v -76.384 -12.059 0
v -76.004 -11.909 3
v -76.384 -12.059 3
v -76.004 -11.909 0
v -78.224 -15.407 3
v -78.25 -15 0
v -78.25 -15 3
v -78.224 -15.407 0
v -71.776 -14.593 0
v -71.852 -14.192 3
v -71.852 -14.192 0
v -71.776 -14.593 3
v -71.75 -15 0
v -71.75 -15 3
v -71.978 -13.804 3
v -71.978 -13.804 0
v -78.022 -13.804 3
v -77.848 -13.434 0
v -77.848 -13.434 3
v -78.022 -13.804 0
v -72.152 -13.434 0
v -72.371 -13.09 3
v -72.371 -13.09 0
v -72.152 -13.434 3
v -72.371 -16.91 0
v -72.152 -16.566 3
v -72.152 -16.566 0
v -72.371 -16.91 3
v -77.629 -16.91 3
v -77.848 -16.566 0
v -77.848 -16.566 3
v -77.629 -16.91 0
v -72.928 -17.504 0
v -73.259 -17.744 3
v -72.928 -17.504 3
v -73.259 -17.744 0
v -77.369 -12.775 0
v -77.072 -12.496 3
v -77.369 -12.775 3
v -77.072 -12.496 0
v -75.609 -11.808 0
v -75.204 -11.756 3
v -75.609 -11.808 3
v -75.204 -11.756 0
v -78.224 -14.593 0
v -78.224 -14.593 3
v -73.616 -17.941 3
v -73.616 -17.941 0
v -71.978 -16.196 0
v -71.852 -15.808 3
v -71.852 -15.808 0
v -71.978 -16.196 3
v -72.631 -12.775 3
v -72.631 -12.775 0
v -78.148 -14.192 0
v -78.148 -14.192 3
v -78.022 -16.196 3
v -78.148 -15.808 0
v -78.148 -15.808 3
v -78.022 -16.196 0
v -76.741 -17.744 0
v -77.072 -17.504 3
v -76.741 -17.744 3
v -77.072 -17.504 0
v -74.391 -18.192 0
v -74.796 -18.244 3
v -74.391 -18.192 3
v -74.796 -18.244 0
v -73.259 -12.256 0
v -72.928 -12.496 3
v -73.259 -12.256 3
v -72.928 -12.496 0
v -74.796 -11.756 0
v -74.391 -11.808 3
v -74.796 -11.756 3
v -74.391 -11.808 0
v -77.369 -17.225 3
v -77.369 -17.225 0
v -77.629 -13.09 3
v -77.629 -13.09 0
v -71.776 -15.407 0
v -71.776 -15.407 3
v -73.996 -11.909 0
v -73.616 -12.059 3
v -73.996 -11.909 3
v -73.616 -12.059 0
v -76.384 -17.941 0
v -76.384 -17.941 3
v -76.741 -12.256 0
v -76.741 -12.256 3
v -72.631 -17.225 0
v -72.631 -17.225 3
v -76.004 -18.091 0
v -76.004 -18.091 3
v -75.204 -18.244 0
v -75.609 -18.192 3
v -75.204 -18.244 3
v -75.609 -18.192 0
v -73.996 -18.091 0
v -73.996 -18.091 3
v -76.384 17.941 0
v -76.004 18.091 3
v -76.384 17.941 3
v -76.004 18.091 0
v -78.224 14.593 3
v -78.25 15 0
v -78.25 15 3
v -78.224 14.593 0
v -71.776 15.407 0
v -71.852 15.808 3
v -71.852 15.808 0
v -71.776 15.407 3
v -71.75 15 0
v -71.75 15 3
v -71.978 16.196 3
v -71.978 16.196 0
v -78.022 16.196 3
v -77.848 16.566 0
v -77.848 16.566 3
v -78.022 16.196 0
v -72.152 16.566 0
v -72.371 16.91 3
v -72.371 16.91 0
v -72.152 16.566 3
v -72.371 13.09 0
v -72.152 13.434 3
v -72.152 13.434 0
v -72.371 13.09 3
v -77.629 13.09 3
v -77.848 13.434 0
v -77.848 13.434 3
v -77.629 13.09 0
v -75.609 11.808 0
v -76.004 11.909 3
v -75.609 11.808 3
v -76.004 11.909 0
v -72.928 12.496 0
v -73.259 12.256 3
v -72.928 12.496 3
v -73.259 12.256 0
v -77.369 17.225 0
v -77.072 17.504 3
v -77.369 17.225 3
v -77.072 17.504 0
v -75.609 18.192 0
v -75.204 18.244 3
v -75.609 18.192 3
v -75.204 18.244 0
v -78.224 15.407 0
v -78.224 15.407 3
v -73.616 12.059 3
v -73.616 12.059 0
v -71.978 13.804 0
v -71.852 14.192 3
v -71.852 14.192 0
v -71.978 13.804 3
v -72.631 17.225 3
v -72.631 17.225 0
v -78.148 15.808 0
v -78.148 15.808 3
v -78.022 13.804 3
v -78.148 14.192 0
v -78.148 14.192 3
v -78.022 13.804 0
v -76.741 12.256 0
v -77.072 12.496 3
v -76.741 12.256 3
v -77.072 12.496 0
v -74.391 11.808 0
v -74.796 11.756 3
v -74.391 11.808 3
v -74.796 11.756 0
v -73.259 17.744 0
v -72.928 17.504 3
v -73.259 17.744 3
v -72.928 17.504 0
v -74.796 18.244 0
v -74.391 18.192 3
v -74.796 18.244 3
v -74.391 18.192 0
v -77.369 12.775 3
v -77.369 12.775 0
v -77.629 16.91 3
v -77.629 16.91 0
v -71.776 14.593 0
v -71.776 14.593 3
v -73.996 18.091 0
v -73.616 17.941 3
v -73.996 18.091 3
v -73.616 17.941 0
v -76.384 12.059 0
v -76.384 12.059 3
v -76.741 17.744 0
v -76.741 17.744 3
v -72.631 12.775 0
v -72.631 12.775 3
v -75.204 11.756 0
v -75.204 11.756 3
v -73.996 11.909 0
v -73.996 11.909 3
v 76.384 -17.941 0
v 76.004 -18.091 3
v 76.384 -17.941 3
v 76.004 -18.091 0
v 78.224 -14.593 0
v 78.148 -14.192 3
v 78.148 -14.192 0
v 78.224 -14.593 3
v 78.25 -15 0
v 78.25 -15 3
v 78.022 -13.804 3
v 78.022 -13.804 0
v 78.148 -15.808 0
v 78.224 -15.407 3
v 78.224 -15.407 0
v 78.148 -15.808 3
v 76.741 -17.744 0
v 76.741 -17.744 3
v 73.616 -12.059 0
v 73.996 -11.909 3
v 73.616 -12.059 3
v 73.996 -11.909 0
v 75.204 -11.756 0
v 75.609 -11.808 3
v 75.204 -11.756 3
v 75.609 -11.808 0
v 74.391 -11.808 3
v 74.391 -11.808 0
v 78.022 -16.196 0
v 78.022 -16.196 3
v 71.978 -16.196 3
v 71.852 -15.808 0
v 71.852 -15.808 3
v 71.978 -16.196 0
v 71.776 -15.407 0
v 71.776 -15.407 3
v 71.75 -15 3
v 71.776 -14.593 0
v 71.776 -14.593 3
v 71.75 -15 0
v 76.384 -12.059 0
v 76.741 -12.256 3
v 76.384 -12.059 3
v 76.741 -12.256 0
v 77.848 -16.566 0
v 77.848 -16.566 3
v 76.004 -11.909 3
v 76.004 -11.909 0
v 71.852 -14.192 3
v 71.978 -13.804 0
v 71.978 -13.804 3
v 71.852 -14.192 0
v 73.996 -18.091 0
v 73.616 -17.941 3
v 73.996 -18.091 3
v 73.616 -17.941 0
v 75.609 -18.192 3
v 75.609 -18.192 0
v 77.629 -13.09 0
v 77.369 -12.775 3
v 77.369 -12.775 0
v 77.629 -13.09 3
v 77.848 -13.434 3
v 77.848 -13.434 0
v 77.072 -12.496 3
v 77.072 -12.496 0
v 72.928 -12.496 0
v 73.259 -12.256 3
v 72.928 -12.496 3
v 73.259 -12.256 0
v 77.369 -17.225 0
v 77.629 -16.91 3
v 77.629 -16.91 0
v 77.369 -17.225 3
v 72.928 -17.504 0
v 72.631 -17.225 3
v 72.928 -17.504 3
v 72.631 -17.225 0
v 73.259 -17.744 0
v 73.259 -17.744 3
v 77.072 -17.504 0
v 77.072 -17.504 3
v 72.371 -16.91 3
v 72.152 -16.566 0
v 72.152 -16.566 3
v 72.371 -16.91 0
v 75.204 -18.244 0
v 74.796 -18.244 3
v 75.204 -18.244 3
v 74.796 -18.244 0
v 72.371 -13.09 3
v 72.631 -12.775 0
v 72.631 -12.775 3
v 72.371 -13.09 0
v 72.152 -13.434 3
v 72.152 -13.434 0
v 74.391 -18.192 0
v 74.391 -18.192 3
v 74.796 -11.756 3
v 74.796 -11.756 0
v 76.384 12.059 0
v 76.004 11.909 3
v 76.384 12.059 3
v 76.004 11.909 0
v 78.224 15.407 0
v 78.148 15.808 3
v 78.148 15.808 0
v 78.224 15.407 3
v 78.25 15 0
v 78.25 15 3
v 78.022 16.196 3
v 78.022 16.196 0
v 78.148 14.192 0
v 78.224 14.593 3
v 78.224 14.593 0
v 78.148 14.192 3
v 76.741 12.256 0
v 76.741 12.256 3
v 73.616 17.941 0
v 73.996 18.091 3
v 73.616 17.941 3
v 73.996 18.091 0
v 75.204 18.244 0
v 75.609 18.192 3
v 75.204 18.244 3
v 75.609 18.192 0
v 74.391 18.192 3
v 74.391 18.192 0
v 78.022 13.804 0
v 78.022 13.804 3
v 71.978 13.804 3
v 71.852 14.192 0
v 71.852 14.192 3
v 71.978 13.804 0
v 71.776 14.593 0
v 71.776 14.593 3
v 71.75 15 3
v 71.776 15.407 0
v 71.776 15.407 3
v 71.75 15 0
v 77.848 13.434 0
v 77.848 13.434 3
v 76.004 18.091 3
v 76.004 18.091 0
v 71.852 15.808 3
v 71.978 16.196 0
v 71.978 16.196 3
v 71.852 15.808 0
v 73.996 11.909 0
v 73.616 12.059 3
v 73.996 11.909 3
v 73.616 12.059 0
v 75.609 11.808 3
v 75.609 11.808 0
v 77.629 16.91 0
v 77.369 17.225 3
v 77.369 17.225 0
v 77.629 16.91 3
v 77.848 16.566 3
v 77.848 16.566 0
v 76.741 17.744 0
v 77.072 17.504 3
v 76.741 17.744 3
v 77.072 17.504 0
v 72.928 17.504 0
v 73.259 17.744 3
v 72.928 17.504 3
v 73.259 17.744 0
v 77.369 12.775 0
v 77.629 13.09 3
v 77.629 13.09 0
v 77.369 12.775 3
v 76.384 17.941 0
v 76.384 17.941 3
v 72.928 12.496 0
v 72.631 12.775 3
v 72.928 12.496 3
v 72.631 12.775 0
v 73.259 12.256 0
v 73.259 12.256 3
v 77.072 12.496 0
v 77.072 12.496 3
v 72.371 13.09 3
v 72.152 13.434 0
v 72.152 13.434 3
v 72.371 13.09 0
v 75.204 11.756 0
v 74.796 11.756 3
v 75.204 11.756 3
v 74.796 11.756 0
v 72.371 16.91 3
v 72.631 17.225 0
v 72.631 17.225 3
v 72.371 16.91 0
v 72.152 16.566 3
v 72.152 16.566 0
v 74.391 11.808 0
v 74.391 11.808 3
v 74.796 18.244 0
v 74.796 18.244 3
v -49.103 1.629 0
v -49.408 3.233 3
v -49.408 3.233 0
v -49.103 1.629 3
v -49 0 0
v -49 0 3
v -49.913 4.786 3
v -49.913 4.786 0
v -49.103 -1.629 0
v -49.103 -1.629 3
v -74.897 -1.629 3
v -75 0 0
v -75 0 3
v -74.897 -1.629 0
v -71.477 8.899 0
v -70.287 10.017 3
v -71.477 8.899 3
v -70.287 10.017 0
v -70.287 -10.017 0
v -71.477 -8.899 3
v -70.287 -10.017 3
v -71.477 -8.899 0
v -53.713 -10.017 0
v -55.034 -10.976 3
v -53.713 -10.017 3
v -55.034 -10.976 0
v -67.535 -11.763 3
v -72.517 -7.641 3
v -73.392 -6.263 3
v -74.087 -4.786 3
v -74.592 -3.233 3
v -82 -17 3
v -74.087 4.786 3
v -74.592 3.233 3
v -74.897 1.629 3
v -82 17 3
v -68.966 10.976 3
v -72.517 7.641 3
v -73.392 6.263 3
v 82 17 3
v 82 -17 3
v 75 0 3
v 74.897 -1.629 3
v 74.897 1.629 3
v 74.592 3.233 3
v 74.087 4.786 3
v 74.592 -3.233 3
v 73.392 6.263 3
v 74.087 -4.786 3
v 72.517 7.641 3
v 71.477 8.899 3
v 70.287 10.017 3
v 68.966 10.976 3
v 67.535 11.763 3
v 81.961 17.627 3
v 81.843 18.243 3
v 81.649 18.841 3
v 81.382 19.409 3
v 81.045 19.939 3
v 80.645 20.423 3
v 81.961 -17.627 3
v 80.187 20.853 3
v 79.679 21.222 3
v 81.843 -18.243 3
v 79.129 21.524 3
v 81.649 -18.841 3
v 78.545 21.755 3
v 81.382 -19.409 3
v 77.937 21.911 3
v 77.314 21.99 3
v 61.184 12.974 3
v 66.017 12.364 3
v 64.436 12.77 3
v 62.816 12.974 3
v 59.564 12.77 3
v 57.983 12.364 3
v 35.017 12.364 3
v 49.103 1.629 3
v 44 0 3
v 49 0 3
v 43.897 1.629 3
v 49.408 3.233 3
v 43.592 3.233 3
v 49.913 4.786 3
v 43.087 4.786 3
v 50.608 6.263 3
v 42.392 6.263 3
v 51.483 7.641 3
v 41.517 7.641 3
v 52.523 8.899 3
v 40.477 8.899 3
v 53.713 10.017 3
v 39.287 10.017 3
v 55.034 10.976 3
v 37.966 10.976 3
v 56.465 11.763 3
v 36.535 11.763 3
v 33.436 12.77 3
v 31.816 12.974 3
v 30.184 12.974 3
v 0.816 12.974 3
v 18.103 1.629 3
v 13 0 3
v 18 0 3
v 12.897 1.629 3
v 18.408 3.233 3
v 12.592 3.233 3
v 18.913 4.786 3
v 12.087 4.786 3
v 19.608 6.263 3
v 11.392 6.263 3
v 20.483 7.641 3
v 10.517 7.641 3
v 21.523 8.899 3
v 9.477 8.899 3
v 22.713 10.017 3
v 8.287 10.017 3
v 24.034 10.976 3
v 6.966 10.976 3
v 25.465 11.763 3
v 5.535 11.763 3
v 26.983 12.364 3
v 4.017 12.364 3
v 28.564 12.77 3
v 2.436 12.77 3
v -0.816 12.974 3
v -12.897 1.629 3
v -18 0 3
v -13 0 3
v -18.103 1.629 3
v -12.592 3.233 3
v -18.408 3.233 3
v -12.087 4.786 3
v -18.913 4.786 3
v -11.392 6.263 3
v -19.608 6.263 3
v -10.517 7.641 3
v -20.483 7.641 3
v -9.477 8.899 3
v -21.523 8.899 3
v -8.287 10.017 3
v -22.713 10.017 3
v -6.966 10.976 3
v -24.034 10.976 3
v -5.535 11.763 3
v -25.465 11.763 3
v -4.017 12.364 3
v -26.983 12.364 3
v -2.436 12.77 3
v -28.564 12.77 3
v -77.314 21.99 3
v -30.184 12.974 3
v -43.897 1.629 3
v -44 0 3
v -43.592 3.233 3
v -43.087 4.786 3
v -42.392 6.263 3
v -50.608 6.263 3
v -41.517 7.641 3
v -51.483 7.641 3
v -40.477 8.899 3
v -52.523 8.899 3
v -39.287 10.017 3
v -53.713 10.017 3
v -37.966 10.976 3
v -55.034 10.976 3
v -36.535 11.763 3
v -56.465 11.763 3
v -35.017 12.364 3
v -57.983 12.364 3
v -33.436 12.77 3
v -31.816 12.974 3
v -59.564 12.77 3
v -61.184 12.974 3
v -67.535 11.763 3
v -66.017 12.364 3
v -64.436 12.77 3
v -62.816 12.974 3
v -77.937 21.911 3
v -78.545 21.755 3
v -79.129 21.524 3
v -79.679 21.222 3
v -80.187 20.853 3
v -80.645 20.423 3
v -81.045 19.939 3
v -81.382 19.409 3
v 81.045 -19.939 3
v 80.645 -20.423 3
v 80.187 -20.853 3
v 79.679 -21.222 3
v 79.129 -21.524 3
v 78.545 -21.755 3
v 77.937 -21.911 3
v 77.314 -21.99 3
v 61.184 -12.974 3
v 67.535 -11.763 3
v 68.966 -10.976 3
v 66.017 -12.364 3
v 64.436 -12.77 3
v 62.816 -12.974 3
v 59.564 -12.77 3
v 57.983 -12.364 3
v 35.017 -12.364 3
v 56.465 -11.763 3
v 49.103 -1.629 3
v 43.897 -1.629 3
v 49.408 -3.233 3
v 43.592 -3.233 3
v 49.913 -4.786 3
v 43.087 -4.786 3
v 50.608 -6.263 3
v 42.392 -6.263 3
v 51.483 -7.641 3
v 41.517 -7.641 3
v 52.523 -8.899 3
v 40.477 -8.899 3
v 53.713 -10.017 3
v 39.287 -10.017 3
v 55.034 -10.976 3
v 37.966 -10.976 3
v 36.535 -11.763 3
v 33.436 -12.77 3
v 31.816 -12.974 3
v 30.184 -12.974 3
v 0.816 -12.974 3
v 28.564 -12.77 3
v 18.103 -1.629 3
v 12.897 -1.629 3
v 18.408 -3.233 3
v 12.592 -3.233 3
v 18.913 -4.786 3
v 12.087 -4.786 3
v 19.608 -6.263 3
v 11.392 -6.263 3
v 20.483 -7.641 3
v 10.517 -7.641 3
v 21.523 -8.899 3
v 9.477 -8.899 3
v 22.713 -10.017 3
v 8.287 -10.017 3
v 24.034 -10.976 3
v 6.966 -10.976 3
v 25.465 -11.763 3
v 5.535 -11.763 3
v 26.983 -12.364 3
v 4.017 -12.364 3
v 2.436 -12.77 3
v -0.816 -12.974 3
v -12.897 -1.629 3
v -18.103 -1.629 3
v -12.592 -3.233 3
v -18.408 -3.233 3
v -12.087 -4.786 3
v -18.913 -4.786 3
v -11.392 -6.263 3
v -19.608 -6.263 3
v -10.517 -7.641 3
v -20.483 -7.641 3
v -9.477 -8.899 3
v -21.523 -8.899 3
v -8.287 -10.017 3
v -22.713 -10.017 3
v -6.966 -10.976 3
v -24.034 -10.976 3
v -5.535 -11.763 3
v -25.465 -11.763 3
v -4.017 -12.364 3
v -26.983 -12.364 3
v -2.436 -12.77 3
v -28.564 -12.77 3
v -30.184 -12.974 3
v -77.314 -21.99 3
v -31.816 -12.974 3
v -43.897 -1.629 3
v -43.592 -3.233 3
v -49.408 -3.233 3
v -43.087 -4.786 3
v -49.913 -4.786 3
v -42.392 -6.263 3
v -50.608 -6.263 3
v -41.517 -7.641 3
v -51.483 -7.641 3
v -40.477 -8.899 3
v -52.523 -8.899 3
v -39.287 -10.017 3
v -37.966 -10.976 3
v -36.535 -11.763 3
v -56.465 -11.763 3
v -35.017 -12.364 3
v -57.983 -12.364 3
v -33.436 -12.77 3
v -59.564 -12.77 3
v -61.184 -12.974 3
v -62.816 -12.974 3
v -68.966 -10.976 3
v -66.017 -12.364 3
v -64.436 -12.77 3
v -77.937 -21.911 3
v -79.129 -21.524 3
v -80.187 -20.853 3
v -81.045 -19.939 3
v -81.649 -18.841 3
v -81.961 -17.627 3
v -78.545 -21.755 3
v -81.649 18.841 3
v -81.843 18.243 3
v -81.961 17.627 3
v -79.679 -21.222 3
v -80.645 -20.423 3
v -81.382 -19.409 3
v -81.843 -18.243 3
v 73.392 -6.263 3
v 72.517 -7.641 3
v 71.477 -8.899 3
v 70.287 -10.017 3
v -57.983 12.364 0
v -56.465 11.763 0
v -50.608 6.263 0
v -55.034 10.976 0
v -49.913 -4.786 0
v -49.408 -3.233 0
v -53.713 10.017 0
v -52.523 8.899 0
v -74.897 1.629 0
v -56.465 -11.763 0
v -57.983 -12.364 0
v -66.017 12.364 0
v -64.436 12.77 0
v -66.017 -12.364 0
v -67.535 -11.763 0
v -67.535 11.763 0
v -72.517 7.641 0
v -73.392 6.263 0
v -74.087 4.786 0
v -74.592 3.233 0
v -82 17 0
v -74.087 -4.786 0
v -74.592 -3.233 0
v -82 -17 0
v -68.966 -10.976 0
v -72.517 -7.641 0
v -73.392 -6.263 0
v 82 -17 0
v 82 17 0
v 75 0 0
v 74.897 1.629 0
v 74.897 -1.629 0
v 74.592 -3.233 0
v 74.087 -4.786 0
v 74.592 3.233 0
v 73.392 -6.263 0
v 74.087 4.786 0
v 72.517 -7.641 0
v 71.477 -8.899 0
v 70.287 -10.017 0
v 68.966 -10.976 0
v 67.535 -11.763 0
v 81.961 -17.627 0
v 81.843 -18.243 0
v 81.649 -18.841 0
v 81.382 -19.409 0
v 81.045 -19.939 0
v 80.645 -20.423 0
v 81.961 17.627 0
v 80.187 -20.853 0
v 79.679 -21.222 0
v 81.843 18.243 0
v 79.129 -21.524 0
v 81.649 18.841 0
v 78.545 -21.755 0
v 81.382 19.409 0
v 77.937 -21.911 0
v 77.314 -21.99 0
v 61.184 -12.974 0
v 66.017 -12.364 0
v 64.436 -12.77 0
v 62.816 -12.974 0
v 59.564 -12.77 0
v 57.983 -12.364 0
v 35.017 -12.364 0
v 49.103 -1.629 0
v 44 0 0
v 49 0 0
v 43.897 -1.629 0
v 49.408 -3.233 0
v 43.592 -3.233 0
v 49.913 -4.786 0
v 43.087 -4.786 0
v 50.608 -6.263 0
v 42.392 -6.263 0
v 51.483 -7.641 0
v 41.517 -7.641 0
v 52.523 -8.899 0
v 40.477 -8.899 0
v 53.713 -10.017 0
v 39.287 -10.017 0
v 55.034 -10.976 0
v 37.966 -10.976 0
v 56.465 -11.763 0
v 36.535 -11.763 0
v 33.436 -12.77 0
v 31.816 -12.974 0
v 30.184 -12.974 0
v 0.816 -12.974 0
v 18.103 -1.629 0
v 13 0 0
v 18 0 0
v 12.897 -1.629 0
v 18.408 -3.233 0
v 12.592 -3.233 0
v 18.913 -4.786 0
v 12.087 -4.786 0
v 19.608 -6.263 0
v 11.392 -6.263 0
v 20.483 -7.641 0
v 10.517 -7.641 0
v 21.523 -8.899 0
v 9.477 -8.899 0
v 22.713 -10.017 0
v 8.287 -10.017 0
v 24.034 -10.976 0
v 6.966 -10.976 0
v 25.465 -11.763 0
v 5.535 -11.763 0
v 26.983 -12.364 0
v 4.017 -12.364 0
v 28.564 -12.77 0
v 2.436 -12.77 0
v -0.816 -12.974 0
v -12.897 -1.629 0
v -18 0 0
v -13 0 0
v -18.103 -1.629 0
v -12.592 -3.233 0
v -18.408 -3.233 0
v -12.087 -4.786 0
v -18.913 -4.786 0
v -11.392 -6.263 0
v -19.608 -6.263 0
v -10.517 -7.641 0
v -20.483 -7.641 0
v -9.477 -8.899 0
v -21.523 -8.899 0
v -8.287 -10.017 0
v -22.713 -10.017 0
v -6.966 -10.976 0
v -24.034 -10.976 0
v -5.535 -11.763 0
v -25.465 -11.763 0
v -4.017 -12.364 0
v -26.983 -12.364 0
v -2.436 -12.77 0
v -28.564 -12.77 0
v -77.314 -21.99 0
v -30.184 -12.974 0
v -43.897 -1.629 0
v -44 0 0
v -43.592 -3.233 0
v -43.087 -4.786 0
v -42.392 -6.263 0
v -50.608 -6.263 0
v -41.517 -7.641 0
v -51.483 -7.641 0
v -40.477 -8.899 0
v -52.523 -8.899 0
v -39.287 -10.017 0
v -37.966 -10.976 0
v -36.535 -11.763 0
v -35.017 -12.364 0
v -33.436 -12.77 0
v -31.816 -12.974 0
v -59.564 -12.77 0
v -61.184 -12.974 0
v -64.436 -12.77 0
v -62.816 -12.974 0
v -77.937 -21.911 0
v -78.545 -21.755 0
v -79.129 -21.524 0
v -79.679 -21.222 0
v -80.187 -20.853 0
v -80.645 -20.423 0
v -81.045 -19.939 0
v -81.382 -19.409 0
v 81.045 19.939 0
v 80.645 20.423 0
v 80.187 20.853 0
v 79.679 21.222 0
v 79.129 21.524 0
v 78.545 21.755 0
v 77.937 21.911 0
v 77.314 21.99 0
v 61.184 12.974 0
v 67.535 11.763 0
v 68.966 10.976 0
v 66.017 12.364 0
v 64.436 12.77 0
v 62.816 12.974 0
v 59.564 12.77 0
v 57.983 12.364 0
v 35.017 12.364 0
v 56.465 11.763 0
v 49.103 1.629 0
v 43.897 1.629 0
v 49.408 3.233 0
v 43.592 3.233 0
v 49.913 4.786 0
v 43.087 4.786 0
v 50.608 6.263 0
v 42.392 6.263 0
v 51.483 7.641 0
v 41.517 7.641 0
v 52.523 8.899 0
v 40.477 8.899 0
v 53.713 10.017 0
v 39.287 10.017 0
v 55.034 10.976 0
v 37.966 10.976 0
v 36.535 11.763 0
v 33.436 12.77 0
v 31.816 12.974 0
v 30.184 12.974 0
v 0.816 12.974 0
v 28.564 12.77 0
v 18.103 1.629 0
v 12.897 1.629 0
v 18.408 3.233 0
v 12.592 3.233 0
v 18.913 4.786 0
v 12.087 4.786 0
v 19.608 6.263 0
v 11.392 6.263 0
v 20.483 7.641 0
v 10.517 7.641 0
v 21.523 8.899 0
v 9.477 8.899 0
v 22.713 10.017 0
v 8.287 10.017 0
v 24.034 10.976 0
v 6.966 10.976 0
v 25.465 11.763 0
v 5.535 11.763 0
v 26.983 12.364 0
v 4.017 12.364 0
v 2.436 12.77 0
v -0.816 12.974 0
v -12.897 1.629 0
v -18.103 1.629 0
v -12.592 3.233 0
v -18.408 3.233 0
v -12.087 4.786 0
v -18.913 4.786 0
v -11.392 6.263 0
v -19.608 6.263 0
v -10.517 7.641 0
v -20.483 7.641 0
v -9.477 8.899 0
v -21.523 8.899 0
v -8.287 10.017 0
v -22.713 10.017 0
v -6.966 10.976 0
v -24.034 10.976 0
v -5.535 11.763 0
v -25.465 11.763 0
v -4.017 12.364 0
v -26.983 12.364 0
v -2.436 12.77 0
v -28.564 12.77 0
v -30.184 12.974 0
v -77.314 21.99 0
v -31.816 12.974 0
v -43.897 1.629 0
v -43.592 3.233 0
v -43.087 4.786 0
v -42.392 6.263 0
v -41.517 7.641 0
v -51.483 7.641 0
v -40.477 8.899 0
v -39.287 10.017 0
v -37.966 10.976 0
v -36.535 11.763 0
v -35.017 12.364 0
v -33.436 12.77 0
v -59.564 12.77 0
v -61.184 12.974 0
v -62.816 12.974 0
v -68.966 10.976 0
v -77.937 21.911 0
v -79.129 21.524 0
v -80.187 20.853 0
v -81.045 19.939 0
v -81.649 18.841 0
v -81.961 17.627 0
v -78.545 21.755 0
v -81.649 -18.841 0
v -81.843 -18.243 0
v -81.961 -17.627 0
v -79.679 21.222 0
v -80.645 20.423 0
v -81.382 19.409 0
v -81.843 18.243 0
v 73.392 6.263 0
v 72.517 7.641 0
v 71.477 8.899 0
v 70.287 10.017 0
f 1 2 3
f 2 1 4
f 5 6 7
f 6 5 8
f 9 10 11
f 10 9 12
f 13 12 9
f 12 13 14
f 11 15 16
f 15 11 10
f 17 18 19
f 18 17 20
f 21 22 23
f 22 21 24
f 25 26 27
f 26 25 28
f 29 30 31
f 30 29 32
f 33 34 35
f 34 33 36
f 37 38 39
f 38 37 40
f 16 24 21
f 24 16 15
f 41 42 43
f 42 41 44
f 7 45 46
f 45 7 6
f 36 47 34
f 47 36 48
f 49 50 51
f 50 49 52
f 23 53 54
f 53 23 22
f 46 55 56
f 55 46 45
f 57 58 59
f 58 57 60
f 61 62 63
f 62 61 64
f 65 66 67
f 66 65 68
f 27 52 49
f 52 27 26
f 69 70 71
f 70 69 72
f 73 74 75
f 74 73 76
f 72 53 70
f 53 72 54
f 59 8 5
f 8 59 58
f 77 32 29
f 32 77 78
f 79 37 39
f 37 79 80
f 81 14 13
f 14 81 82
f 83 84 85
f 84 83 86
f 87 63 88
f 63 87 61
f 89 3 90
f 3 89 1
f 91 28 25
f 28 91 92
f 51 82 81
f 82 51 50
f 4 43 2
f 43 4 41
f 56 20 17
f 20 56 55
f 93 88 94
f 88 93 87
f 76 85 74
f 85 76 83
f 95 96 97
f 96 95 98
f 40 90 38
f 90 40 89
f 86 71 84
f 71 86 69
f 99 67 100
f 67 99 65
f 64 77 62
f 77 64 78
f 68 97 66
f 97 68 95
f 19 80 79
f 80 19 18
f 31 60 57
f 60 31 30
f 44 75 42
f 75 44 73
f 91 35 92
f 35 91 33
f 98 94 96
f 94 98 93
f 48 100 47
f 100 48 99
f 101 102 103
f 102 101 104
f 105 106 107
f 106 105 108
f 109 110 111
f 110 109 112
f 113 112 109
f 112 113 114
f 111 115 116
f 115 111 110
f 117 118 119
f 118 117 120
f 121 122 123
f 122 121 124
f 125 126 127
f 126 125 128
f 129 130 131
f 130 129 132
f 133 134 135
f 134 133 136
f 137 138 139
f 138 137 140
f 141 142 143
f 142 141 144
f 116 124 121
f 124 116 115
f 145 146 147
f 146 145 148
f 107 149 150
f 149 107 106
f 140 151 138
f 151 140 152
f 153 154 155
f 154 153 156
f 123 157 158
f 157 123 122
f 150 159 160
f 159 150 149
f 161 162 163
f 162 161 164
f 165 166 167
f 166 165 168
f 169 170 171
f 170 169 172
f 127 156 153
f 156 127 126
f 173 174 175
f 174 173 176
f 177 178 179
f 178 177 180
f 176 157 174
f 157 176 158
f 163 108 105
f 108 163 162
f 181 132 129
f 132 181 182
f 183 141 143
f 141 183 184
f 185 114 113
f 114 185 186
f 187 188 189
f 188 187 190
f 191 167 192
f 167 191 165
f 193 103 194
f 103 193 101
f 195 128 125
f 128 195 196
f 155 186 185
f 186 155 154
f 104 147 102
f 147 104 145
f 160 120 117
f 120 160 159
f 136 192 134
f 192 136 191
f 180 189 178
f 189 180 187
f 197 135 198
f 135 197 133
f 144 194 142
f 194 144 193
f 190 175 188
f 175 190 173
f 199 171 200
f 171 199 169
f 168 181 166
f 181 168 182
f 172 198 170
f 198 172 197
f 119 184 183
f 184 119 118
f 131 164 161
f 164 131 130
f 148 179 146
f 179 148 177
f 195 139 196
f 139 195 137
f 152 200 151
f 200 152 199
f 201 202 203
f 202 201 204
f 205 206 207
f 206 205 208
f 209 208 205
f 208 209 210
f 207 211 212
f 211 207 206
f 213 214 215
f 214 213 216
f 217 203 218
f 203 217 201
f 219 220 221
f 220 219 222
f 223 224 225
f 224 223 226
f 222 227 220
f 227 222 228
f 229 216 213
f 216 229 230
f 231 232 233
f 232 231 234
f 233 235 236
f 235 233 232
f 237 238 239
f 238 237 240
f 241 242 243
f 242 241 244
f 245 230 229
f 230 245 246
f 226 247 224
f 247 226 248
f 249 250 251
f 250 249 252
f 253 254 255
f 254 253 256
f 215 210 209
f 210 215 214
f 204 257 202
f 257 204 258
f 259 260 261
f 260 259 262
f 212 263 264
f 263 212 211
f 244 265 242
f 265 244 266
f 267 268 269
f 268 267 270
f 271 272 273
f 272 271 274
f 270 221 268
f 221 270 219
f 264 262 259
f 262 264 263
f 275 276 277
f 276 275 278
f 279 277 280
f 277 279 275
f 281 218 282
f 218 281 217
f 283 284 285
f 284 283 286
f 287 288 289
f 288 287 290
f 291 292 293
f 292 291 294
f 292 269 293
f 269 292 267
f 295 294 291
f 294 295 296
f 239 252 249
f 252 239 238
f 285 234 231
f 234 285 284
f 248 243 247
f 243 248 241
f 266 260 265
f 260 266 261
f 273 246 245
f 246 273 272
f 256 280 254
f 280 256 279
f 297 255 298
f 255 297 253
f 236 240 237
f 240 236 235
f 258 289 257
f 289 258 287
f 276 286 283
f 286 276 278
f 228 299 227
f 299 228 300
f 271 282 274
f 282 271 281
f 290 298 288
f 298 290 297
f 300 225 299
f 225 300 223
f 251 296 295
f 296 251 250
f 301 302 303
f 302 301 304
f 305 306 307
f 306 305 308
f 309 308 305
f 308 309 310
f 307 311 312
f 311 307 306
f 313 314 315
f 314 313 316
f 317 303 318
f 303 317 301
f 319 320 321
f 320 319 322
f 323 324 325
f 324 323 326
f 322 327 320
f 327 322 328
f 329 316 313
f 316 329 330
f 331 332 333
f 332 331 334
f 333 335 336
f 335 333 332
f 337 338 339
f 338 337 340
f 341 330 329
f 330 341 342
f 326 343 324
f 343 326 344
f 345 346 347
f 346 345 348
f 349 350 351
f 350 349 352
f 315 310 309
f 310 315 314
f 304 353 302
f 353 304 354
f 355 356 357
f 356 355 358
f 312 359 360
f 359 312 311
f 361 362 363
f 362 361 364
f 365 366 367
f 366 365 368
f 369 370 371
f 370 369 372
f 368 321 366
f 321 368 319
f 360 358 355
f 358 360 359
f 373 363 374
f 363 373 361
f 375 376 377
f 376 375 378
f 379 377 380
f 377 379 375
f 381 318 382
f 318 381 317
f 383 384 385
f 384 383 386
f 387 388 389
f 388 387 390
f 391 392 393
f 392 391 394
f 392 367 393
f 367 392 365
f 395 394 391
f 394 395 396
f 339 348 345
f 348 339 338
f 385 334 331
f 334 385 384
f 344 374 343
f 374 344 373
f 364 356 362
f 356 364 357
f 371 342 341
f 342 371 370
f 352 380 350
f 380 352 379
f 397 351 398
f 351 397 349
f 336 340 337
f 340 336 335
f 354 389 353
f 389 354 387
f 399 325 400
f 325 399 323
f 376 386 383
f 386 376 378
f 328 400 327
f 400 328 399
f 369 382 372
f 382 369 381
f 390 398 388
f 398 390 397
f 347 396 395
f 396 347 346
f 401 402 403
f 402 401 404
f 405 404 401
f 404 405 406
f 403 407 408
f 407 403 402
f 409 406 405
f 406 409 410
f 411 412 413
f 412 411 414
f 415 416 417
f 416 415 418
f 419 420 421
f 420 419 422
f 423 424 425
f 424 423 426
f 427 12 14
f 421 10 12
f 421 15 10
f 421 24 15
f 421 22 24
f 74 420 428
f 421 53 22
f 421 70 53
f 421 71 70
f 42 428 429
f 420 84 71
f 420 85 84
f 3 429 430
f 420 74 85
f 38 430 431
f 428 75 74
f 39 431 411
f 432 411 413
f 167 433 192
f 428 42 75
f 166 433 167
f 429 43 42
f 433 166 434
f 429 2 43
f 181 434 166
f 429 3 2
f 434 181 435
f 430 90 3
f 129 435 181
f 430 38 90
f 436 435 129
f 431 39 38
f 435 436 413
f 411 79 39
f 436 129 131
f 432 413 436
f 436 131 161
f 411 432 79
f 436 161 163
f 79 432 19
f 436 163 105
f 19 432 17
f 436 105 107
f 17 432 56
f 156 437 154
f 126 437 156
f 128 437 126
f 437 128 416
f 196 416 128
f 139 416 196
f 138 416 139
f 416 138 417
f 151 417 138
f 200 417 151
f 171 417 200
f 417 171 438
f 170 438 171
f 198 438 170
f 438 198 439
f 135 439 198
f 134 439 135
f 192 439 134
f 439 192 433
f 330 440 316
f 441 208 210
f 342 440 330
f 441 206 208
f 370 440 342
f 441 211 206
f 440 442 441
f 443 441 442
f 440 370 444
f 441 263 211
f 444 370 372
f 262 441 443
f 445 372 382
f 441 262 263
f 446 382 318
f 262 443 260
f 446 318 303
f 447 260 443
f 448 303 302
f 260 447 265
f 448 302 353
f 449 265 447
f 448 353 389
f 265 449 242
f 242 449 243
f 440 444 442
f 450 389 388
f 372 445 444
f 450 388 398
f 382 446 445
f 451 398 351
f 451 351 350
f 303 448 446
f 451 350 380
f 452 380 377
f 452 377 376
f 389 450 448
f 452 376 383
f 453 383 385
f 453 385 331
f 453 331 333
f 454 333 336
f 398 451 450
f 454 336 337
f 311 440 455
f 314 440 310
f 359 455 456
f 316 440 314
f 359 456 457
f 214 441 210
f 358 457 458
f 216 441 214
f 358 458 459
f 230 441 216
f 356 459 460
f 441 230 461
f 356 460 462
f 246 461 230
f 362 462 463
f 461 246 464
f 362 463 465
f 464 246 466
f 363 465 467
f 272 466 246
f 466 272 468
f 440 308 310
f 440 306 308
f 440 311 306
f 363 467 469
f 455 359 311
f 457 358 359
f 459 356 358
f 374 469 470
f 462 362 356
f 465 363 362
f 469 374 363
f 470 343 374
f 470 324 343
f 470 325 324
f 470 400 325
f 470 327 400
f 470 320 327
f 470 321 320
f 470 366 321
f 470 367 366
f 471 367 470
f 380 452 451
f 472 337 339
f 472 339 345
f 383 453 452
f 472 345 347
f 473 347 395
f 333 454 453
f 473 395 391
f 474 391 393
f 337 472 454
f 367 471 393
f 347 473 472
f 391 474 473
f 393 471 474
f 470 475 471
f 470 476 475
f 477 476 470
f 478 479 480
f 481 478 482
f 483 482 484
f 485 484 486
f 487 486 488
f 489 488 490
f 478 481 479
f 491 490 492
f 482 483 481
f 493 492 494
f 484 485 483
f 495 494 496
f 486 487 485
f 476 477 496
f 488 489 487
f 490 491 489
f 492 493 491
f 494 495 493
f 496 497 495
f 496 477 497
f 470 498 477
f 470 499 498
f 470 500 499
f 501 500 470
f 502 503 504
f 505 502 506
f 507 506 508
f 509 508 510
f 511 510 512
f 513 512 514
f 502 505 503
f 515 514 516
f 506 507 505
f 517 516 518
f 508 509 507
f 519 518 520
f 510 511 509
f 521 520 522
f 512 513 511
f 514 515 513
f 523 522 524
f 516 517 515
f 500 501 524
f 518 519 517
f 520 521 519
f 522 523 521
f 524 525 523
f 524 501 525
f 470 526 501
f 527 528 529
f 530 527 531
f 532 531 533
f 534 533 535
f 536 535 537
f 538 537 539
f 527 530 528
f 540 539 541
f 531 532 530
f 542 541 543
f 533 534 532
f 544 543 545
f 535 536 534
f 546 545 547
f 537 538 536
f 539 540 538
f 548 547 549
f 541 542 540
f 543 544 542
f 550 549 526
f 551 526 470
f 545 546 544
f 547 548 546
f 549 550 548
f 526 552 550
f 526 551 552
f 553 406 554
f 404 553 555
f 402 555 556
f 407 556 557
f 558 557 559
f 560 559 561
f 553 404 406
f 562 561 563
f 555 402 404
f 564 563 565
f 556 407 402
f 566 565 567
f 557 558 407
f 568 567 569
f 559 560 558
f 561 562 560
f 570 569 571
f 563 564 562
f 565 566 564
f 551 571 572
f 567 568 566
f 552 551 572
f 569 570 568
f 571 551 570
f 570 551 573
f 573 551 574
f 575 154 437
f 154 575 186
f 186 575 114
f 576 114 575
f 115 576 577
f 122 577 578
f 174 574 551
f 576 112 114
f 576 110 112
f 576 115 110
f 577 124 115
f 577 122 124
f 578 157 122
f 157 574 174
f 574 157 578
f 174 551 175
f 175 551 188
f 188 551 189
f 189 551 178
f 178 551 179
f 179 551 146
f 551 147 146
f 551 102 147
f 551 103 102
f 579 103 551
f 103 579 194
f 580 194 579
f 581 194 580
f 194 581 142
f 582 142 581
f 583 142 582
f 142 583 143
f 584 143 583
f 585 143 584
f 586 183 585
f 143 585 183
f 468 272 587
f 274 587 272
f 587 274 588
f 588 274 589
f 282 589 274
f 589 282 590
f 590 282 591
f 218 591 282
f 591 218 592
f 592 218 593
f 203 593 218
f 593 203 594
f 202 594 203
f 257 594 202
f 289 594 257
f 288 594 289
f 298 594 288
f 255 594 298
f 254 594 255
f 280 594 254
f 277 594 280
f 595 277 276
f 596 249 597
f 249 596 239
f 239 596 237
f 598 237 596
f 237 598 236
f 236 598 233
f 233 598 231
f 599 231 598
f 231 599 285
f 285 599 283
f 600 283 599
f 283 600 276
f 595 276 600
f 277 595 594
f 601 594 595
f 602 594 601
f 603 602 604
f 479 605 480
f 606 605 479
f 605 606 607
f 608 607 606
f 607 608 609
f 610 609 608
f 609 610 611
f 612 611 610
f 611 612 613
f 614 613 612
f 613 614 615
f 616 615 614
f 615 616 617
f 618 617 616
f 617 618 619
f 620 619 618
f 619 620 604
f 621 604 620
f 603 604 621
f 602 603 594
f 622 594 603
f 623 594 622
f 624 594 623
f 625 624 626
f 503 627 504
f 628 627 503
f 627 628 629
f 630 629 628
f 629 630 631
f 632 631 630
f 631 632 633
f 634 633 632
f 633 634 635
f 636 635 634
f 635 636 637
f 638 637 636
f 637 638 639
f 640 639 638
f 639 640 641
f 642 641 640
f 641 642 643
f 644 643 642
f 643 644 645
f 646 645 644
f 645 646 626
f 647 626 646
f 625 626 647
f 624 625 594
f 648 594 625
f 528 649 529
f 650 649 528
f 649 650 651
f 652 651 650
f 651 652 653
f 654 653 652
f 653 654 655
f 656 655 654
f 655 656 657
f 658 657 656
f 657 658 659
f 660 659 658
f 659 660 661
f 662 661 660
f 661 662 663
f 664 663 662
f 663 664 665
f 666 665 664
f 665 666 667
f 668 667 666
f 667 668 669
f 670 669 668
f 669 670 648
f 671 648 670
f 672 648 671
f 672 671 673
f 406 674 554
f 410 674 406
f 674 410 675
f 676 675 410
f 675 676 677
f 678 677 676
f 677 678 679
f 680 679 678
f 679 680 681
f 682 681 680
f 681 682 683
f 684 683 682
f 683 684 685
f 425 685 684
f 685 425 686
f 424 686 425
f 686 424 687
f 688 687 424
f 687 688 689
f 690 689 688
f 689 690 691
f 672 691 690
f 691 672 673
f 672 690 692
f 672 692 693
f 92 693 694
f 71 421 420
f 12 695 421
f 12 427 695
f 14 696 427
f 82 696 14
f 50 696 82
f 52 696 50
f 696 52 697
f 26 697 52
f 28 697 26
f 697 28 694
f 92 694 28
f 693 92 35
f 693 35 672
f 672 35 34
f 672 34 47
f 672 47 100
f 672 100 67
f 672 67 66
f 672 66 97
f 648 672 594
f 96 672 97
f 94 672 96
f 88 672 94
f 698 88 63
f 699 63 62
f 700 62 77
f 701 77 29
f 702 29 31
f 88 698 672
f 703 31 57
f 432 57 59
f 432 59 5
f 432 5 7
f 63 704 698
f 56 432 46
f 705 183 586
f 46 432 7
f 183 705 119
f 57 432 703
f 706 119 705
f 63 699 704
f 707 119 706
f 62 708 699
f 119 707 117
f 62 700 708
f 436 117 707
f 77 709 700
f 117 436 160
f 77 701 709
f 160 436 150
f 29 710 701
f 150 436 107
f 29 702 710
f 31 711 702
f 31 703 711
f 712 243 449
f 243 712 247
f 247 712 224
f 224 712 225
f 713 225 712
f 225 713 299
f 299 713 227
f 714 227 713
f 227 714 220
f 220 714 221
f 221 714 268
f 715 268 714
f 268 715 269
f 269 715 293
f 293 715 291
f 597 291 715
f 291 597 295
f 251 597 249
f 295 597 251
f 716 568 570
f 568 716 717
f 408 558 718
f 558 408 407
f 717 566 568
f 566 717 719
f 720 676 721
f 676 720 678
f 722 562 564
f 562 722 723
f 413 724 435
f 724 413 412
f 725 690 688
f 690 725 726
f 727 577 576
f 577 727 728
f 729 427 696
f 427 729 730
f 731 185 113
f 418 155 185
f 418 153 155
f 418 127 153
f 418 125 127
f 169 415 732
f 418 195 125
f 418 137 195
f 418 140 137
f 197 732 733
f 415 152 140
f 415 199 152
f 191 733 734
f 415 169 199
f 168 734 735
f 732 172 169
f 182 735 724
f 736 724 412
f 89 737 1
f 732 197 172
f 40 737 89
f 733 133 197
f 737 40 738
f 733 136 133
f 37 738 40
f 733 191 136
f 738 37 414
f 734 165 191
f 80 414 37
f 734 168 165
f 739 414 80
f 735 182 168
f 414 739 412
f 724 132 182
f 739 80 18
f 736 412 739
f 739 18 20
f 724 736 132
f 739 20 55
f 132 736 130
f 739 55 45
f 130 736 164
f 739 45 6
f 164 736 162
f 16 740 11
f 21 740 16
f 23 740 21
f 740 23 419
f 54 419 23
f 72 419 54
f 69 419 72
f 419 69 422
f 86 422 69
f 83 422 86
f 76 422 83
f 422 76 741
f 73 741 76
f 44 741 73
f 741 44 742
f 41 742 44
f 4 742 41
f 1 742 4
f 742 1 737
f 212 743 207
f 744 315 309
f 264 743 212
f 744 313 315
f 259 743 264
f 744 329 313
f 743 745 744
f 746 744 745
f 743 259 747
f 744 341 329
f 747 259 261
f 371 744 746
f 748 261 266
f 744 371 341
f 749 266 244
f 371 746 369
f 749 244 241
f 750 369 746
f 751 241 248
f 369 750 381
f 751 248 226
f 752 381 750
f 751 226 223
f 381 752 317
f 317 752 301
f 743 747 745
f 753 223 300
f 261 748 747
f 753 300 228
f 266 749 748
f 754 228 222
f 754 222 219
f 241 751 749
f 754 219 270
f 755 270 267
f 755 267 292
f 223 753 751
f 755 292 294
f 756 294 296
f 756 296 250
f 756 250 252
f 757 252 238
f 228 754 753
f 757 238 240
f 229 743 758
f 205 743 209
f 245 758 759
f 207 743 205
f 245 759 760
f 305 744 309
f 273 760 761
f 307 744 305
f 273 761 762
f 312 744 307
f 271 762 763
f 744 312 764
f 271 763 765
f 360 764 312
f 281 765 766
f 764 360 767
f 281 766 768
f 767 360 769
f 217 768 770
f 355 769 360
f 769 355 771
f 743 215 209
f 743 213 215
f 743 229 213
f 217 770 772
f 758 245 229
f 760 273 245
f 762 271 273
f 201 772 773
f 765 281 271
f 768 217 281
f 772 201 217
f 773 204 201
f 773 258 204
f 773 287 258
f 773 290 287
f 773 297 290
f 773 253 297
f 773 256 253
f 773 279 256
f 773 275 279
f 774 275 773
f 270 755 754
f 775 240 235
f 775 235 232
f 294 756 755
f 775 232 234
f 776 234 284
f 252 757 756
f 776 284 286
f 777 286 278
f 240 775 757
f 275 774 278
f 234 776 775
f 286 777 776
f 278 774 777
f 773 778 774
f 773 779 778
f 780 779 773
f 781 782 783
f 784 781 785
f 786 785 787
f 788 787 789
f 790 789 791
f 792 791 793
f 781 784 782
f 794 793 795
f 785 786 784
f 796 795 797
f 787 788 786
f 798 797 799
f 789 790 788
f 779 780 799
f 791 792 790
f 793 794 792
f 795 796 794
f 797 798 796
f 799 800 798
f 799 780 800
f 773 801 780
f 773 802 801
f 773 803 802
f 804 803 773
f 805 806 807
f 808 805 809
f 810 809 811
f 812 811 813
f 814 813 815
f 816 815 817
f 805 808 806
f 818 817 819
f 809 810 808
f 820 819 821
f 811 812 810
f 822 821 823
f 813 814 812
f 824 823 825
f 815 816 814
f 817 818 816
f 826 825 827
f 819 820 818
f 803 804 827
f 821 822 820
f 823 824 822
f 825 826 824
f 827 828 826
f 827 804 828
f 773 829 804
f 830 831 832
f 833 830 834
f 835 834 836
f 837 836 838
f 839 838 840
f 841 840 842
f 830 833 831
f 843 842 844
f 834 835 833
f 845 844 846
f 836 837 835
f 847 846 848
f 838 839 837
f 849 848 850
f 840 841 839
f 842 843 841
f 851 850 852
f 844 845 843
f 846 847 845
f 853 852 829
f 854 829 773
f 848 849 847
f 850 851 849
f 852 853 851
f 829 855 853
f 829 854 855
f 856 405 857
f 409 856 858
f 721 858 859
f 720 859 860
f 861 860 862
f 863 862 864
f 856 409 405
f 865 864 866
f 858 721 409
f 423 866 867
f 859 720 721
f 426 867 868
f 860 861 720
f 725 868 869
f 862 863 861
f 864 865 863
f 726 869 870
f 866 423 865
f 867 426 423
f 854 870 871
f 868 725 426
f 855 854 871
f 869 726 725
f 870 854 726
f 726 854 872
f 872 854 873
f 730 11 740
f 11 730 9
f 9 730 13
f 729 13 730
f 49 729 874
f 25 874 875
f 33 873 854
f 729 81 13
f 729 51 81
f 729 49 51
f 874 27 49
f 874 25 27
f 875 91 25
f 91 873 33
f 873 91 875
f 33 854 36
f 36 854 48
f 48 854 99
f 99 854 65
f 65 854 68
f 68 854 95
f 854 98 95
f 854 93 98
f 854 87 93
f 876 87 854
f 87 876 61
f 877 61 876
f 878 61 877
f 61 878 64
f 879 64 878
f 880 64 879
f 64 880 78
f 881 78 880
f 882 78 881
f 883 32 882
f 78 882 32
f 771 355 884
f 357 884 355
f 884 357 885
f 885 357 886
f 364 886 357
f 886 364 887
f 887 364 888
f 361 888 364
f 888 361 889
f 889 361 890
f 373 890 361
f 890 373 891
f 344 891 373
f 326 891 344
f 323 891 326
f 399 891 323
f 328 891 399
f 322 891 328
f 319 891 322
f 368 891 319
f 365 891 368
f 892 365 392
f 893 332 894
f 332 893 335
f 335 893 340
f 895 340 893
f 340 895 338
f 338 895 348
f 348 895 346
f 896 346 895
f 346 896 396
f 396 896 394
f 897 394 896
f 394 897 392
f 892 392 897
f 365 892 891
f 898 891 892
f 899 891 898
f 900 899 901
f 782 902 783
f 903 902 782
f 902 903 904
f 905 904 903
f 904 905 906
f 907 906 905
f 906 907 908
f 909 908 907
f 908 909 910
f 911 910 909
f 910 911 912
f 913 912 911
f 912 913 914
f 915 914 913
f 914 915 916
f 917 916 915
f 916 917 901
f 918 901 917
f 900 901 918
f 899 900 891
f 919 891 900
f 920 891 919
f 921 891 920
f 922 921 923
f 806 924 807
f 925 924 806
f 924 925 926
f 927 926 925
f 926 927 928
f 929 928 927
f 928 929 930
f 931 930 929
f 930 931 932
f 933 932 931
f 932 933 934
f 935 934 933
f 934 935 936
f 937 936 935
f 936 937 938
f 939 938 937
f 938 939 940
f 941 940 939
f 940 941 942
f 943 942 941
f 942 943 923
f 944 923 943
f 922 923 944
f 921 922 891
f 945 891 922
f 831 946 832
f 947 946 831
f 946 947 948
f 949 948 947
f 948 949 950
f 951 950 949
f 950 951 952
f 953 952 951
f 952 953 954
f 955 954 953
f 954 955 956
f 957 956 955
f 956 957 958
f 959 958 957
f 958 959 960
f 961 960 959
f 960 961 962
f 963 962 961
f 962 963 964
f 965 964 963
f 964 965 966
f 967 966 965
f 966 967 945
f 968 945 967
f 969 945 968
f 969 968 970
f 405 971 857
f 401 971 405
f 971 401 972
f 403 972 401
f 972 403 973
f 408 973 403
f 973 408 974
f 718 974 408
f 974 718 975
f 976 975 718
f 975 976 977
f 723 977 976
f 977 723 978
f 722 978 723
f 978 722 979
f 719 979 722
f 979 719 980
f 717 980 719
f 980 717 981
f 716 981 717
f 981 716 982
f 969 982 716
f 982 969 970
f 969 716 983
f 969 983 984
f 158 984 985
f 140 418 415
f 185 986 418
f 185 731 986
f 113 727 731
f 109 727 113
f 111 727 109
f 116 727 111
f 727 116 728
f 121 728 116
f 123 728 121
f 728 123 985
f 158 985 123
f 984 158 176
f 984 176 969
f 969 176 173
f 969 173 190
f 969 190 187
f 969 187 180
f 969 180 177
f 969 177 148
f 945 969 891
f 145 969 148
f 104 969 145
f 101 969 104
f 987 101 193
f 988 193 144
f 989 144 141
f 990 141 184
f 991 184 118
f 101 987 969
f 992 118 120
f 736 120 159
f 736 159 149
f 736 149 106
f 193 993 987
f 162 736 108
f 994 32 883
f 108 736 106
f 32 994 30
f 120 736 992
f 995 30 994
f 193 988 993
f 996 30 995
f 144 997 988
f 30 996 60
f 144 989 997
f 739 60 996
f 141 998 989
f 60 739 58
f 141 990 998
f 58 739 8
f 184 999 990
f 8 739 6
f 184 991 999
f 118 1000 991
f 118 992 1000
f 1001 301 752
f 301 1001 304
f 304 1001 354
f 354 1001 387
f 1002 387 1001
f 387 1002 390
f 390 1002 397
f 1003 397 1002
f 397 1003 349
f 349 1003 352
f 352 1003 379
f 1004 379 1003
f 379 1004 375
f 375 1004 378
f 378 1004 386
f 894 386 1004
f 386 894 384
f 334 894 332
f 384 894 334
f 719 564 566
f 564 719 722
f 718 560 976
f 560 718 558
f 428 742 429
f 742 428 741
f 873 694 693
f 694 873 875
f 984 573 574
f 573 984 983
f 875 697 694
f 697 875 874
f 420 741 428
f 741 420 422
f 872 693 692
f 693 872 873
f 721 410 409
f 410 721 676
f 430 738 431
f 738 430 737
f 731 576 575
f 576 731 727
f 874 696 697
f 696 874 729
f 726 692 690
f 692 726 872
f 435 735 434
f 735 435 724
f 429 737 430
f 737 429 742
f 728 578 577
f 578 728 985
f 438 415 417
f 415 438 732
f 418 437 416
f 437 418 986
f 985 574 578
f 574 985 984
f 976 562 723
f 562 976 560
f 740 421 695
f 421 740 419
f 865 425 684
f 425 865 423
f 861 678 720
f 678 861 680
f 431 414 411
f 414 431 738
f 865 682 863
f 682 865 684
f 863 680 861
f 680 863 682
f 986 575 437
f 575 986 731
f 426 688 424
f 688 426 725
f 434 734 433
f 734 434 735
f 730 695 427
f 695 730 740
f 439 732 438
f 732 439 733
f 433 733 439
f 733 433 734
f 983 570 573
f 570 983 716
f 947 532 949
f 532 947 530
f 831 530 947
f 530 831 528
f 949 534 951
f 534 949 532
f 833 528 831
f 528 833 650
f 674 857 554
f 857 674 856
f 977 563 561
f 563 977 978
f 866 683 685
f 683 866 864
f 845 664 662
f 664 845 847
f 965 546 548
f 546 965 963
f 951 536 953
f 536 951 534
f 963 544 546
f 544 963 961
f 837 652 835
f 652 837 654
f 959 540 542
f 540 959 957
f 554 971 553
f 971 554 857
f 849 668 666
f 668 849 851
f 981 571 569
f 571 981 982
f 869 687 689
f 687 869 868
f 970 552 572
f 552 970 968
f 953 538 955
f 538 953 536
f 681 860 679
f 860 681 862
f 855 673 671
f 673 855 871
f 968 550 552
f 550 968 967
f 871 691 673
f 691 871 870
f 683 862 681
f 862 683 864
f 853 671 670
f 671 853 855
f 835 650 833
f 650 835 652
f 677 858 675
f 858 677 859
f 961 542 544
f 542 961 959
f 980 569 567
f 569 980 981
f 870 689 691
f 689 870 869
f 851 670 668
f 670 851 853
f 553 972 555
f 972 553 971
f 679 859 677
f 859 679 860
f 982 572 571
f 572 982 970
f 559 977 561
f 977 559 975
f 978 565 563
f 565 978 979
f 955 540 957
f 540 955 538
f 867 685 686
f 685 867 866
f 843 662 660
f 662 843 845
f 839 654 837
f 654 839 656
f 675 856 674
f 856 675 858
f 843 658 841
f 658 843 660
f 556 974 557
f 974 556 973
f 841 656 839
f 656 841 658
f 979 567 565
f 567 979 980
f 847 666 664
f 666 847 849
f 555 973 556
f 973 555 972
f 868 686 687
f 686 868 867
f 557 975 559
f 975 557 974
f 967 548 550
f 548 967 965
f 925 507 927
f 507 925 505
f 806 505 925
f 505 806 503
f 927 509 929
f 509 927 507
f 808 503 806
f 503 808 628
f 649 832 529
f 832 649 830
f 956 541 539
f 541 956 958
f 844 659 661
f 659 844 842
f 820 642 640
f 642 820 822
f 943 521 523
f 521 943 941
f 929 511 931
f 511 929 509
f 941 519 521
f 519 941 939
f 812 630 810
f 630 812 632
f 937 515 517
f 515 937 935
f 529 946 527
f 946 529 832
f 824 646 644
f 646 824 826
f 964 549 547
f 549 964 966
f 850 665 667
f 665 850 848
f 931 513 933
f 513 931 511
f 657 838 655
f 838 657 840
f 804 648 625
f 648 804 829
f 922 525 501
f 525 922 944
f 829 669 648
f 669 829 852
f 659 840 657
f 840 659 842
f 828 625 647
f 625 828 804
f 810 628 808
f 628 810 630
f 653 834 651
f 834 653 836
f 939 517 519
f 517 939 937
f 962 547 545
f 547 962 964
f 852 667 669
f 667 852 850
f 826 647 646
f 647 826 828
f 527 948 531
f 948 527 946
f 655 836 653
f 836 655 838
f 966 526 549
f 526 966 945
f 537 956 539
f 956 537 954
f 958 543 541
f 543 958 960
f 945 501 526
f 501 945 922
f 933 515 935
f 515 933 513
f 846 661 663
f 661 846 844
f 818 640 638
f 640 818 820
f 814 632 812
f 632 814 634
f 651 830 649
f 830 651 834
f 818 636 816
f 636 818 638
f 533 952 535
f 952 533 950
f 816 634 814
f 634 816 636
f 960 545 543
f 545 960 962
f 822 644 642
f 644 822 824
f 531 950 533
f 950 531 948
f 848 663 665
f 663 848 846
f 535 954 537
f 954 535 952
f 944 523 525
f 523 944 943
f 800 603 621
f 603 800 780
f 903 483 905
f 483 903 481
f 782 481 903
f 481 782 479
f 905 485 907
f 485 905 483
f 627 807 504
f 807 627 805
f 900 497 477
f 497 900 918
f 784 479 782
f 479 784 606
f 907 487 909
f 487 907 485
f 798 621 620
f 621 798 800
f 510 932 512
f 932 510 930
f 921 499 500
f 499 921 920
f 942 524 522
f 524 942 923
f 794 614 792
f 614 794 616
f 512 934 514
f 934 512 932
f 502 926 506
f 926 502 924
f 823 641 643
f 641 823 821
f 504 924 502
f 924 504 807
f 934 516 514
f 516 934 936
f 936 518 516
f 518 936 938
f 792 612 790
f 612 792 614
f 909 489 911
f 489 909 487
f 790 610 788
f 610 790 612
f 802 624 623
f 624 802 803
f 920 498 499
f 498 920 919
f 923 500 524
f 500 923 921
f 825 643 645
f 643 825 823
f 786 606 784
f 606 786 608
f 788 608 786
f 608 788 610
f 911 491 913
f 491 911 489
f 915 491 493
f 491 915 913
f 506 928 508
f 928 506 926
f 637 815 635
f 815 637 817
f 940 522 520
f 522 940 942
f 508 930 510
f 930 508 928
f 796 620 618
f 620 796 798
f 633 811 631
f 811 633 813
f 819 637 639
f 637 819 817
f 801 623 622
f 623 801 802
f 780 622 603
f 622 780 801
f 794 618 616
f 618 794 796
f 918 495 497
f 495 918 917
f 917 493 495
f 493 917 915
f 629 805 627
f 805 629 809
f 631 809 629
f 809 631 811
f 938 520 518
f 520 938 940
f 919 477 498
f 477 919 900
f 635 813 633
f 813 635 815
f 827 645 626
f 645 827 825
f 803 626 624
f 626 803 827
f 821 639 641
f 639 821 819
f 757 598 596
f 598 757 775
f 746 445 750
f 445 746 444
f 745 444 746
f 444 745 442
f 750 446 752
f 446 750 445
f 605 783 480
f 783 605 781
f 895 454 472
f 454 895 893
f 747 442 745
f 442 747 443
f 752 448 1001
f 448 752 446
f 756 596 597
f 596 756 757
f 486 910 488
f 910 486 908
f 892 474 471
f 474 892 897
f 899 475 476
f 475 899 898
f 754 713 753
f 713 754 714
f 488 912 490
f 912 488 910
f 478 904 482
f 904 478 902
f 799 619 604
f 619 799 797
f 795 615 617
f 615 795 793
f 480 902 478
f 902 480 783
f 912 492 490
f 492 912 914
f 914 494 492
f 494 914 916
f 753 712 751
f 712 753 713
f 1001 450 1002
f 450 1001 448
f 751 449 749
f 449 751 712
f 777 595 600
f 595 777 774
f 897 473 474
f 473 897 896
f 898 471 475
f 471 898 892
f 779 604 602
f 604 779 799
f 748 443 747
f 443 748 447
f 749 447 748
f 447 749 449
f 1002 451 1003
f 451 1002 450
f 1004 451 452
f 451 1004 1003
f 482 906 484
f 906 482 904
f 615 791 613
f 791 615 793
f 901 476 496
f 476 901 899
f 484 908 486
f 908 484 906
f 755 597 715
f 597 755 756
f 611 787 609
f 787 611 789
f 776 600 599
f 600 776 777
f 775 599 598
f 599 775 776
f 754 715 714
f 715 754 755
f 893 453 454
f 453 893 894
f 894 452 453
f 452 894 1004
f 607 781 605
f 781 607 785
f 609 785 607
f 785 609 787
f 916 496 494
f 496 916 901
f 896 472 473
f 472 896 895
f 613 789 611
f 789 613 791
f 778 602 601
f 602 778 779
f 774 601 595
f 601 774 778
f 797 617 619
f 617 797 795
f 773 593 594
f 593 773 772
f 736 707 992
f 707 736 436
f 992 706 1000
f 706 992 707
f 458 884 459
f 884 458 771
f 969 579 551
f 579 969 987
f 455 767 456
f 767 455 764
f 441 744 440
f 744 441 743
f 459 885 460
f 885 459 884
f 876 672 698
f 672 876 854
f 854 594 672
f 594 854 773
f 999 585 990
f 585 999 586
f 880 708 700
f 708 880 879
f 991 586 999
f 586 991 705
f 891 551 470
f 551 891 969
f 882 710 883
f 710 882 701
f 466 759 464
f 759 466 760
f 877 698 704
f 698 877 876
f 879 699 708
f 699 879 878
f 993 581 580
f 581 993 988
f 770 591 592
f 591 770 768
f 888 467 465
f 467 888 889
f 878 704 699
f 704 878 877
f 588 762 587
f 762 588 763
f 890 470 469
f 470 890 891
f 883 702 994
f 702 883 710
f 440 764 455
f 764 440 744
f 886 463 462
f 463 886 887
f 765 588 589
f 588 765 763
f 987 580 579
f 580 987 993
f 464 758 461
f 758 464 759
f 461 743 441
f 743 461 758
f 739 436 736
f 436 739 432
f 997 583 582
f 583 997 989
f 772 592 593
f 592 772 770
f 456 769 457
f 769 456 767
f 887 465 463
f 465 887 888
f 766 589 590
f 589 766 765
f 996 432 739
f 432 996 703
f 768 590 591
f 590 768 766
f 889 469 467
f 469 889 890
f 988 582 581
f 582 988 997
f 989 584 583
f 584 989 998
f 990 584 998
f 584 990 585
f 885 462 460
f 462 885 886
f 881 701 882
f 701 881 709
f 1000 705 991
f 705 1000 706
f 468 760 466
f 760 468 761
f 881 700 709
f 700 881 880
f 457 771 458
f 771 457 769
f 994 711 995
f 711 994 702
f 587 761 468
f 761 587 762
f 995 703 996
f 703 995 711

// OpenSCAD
$fn = 50;


difference() {
	union() {
		hull() {
			translate(v = [-77.0000000000, 17.0000000000, 0]) {
				cylinder(h = 3, r = 5);
			}
			translate(v = [77.0000000000, 17.0000000000, 0]) {
				cylinder(h = 3, r = 5);
			}
			translate(v = [-77.0000000000, -17.0000000000, 0]) {
				cylinder(h = 3, r = 5);
			}
			translate(v = [77.0000000000, -17.0000000000, 0]) {
				cylinder(h = 3, r = 5);
			}
		}
	}
	union() {
		#translate(v = [-75.0000000000, -15.0000000000, -100.0000000000]) {
			cylinder(h = 200, r = 3.2500000000);
		}
		#translate(v = [-75.0000000000, 15.0000000000, -100.0000000000]) {
			cylinder(h = 200, r = 3.2500000000);
		}
		#translate(v = [75.0000000000, -15.0000000000, -100.0000000000]) {
			cylinder(h = 200, r = 3.2500000000);
		}
		#translate(v = [75.0000000000, 15.0000000000, -100.0000000000]) {
			cylinder(h = 200, r = 3.2500000000);
		}
		#translate(v = [-62.0000000000, 0, 0]) {
			cylinder(h = 3, r = 13.0000000000);
		}
		#translate(v = [-31.0000000000, 0, 0]) {
			cylinder(h = 3, r = 13.0000000000);
		}
		#cylinder(h = 3, r = 13.0000000000);
		#translate(v = [31.0000000000, 0, 0]) {
			cylinder(h = 3, r = 13.0000000000);
		}
		#translate(v = [62.0000000000, 0, 0]) {
			cylinder(h = 3, r = 13.0000000000);
		}
	}
}
